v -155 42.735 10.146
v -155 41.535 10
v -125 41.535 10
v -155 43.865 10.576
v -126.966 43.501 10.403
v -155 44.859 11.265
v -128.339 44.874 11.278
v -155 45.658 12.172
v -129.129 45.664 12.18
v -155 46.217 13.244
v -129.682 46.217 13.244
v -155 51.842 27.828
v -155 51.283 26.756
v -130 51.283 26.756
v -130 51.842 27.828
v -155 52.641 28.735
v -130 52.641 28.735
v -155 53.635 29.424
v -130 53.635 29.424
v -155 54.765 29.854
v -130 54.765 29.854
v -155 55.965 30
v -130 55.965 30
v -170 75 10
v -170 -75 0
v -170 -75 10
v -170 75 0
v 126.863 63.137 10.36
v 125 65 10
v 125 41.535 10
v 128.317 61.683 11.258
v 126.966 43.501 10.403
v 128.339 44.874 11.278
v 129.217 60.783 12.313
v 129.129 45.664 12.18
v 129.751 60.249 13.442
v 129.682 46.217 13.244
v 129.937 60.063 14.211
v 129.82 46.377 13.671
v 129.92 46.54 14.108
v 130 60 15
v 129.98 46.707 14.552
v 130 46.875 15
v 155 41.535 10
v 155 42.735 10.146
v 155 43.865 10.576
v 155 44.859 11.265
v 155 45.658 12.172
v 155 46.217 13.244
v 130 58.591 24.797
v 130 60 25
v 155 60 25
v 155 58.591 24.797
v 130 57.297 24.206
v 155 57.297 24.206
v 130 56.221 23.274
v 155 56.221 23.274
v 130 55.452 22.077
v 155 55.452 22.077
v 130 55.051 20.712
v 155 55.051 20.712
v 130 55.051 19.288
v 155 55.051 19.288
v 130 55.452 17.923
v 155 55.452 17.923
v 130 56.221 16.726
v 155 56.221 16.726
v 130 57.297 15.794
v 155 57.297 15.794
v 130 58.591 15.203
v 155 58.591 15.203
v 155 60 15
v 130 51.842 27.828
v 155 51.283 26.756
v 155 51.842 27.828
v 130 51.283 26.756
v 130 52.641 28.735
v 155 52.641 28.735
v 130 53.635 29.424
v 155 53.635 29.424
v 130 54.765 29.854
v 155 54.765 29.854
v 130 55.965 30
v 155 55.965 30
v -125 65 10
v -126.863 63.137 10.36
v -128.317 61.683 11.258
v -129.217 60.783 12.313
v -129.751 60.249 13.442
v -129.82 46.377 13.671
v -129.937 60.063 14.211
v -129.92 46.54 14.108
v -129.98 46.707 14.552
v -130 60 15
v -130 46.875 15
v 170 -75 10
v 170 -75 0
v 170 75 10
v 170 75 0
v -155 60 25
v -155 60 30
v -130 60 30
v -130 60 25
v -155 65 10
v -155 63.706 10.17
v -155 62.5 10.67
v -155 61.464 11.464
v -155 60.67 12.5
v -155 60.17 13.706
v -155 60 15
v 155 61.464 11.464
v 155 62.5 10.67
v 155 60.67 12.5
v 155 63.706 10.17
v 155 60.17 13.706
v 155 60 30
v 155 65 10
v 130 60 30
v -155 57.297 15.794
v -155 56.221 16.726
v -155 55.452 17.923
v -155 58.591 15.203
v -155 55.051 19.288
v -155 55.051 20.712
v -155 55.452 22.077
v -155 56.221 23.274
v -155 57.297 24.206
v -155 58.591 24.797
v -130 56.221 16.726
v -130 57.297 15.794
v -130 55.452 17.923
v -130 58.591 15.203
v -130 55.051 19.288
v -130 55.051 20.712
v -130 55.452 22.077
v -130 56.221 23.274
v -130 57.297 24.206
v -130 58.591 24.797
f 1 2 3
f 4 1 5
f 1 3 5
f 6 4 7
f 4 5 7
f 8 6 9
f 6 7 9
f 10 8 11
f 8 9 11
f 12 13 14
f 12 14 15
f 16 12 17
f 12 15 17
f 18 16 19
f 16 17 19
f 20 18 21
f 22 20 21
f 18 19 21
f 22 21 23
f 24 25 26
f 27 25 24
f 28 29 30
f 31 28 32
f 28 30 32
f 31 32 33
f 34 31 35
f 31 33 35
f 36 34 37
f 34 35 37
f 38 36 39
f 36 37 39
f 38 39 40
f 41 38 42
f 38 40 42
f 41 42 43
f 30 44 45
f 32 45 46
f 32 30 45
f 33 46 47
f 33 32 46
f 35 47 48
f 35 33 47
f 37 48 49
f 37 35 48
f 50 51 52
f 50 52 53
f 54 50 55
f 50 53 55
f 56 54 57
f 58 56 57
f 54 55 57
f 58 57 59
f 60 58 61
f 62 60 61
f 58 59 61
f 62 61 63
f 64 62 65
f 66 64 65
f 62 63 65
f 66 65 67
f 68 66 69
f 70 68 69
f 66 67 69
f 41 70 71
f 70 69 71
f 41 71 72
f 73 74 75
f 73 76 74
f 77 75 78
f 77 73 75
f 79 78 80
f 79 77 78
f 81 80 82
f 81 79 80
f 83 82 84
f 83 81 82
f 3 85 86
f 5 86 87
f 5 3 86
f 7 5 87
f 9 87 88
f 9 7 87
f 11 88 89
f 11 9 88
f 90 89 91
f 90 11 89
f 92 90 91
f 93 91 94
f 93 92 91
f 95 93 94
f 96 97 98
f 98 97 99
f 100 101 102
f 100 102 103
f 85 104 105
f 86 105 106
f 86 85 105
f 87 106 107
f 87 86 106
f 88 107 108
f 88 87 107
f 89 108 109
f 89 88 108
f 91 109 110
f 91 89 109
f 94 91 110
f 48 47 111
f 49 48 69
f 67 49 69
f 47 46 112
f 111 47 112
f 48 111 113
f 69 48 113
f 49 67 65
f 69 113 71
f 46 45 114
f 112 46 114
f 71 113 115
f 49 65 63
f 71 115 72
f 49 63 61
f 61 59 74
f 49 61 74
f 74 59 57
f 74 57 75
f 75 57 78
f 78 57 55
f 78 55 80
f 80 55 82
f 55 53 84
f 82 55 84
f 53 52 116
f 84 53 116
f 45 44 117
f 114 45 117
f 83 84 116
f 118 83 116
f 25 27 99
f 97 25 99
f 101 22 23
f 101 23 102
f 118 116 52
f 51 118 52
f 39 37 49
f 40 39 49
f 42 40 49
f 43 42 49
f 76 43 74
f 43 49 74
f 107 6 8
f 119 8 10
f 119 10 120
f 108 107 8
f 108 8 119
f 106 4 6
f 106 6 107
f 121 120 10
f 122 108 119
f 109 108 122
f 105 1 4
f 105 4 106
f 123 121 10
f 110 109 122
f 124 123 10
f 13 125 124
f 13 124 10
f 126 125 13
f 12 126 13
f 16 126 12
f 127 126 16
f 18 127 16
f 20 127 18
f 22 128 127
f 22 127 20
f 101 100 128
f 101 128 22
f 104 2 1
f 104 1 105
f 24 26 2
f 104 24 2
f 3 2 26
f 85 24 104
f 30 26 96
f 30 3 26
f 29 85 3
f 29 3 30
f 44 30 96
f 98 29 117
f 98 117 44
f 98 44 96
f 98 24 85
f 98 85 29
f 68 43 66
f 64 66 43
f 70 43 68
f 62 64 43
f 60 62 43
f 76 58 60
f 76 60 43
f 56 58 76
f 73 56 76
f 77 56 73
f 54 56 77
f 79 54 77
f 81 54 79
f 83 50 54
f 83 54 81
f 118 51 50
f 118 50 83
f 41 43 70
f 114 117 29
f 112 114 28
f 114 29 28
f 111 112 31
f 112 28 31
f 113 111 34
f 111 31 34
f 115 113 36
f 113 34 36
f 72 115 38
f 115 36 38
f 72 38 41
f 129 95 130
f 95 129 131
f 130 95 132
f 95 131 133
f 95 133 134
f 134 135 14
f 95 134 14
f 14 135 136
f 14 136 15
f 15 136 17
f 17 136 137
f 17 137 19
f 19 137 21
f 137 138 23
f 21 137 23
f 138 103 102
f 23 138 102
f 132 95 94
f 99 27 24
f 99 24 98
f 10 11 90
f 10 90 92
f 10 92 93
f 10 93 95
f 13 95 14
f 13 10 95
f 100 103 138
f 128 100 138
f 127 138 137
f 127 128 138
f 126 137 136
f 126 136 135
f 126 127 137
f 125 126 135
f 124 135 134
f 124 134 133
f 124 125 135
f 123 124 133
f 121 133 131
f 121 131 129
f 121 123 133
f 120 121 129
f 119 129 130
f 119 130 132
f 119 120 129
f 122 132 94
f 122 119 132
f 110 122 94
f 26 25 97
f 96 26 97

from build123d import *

# Parameters (mm, degrees)
SKETCH1_W                 = 340
SKETCH1_H                 = 150
VERTICAL_PORTION_DEPTH    = 10
SHAFT_ADAPTER_RIGHT_DEPTH = 25
SHAFT_ADAPTER_FILLETS_R   = 5


with BuildPart() as part:
    # Sketch1 → Vertical portion (new body)
    with BuildSketch(Plane.XY):
        Rectangle(SKETCH1_W, SKETCH1_H)
    extrude(amount=VERTICAL_PORTION_DEPTH)

    # Sketch4 → Shaft adapter right (add)
    with BuildSketch(Plane(origin=(155, 0, 0), x_dir=(0, 0, -1), z_dir=(1, 0, 0))):
        with BuildLine():
            Line((-10, 45), (-30, 52.5))
            Line((-30, 52.5), (-30, 60))
            Line((-30, 60), (-25, 60))
            ThreePointArc((-25, 60), (-20, 55), (-15, 60))
            Line((-15, 60), (-10, 60))
            Line((-10, 60), (-10, 55))
            Line((-10, 55), (-10, 45))
        make_face()
    shaft_adapter_right = extrude(amount=-SHAFT_ADAPTER_RIGHT_DEPTH)

    # Shaft adapter left: Shaft adapter right across plane
    add(shaft_adapter_right.mirror(Plane(origin=(0, 0, 0), x_dir=(0, 0, 1), z_dir=(1, 0, 0))))

    # Shaft adapter fillets
    shaft_adapter_fillets_edges = [part.edges().sort_by_distance(p)[0] for p in [
        (-142.5, 52.5, 30),
        (142.5, 52.5, 30),
        (130, 52.5, 10),
        (-130, 52.5, 10),
        (-142.5, 45, 10),
        (142.5, 45, 10),
        (142.5, 60, 10),
        (-142.5, 60, 10),
    ]]
    fillet(shaft_adapter_fillets_edges, radius=SHAFT_ADAPTER_FILLETS_R - 0.0001)  # a hair under: the kernel refuses the full size


solid = part.part
